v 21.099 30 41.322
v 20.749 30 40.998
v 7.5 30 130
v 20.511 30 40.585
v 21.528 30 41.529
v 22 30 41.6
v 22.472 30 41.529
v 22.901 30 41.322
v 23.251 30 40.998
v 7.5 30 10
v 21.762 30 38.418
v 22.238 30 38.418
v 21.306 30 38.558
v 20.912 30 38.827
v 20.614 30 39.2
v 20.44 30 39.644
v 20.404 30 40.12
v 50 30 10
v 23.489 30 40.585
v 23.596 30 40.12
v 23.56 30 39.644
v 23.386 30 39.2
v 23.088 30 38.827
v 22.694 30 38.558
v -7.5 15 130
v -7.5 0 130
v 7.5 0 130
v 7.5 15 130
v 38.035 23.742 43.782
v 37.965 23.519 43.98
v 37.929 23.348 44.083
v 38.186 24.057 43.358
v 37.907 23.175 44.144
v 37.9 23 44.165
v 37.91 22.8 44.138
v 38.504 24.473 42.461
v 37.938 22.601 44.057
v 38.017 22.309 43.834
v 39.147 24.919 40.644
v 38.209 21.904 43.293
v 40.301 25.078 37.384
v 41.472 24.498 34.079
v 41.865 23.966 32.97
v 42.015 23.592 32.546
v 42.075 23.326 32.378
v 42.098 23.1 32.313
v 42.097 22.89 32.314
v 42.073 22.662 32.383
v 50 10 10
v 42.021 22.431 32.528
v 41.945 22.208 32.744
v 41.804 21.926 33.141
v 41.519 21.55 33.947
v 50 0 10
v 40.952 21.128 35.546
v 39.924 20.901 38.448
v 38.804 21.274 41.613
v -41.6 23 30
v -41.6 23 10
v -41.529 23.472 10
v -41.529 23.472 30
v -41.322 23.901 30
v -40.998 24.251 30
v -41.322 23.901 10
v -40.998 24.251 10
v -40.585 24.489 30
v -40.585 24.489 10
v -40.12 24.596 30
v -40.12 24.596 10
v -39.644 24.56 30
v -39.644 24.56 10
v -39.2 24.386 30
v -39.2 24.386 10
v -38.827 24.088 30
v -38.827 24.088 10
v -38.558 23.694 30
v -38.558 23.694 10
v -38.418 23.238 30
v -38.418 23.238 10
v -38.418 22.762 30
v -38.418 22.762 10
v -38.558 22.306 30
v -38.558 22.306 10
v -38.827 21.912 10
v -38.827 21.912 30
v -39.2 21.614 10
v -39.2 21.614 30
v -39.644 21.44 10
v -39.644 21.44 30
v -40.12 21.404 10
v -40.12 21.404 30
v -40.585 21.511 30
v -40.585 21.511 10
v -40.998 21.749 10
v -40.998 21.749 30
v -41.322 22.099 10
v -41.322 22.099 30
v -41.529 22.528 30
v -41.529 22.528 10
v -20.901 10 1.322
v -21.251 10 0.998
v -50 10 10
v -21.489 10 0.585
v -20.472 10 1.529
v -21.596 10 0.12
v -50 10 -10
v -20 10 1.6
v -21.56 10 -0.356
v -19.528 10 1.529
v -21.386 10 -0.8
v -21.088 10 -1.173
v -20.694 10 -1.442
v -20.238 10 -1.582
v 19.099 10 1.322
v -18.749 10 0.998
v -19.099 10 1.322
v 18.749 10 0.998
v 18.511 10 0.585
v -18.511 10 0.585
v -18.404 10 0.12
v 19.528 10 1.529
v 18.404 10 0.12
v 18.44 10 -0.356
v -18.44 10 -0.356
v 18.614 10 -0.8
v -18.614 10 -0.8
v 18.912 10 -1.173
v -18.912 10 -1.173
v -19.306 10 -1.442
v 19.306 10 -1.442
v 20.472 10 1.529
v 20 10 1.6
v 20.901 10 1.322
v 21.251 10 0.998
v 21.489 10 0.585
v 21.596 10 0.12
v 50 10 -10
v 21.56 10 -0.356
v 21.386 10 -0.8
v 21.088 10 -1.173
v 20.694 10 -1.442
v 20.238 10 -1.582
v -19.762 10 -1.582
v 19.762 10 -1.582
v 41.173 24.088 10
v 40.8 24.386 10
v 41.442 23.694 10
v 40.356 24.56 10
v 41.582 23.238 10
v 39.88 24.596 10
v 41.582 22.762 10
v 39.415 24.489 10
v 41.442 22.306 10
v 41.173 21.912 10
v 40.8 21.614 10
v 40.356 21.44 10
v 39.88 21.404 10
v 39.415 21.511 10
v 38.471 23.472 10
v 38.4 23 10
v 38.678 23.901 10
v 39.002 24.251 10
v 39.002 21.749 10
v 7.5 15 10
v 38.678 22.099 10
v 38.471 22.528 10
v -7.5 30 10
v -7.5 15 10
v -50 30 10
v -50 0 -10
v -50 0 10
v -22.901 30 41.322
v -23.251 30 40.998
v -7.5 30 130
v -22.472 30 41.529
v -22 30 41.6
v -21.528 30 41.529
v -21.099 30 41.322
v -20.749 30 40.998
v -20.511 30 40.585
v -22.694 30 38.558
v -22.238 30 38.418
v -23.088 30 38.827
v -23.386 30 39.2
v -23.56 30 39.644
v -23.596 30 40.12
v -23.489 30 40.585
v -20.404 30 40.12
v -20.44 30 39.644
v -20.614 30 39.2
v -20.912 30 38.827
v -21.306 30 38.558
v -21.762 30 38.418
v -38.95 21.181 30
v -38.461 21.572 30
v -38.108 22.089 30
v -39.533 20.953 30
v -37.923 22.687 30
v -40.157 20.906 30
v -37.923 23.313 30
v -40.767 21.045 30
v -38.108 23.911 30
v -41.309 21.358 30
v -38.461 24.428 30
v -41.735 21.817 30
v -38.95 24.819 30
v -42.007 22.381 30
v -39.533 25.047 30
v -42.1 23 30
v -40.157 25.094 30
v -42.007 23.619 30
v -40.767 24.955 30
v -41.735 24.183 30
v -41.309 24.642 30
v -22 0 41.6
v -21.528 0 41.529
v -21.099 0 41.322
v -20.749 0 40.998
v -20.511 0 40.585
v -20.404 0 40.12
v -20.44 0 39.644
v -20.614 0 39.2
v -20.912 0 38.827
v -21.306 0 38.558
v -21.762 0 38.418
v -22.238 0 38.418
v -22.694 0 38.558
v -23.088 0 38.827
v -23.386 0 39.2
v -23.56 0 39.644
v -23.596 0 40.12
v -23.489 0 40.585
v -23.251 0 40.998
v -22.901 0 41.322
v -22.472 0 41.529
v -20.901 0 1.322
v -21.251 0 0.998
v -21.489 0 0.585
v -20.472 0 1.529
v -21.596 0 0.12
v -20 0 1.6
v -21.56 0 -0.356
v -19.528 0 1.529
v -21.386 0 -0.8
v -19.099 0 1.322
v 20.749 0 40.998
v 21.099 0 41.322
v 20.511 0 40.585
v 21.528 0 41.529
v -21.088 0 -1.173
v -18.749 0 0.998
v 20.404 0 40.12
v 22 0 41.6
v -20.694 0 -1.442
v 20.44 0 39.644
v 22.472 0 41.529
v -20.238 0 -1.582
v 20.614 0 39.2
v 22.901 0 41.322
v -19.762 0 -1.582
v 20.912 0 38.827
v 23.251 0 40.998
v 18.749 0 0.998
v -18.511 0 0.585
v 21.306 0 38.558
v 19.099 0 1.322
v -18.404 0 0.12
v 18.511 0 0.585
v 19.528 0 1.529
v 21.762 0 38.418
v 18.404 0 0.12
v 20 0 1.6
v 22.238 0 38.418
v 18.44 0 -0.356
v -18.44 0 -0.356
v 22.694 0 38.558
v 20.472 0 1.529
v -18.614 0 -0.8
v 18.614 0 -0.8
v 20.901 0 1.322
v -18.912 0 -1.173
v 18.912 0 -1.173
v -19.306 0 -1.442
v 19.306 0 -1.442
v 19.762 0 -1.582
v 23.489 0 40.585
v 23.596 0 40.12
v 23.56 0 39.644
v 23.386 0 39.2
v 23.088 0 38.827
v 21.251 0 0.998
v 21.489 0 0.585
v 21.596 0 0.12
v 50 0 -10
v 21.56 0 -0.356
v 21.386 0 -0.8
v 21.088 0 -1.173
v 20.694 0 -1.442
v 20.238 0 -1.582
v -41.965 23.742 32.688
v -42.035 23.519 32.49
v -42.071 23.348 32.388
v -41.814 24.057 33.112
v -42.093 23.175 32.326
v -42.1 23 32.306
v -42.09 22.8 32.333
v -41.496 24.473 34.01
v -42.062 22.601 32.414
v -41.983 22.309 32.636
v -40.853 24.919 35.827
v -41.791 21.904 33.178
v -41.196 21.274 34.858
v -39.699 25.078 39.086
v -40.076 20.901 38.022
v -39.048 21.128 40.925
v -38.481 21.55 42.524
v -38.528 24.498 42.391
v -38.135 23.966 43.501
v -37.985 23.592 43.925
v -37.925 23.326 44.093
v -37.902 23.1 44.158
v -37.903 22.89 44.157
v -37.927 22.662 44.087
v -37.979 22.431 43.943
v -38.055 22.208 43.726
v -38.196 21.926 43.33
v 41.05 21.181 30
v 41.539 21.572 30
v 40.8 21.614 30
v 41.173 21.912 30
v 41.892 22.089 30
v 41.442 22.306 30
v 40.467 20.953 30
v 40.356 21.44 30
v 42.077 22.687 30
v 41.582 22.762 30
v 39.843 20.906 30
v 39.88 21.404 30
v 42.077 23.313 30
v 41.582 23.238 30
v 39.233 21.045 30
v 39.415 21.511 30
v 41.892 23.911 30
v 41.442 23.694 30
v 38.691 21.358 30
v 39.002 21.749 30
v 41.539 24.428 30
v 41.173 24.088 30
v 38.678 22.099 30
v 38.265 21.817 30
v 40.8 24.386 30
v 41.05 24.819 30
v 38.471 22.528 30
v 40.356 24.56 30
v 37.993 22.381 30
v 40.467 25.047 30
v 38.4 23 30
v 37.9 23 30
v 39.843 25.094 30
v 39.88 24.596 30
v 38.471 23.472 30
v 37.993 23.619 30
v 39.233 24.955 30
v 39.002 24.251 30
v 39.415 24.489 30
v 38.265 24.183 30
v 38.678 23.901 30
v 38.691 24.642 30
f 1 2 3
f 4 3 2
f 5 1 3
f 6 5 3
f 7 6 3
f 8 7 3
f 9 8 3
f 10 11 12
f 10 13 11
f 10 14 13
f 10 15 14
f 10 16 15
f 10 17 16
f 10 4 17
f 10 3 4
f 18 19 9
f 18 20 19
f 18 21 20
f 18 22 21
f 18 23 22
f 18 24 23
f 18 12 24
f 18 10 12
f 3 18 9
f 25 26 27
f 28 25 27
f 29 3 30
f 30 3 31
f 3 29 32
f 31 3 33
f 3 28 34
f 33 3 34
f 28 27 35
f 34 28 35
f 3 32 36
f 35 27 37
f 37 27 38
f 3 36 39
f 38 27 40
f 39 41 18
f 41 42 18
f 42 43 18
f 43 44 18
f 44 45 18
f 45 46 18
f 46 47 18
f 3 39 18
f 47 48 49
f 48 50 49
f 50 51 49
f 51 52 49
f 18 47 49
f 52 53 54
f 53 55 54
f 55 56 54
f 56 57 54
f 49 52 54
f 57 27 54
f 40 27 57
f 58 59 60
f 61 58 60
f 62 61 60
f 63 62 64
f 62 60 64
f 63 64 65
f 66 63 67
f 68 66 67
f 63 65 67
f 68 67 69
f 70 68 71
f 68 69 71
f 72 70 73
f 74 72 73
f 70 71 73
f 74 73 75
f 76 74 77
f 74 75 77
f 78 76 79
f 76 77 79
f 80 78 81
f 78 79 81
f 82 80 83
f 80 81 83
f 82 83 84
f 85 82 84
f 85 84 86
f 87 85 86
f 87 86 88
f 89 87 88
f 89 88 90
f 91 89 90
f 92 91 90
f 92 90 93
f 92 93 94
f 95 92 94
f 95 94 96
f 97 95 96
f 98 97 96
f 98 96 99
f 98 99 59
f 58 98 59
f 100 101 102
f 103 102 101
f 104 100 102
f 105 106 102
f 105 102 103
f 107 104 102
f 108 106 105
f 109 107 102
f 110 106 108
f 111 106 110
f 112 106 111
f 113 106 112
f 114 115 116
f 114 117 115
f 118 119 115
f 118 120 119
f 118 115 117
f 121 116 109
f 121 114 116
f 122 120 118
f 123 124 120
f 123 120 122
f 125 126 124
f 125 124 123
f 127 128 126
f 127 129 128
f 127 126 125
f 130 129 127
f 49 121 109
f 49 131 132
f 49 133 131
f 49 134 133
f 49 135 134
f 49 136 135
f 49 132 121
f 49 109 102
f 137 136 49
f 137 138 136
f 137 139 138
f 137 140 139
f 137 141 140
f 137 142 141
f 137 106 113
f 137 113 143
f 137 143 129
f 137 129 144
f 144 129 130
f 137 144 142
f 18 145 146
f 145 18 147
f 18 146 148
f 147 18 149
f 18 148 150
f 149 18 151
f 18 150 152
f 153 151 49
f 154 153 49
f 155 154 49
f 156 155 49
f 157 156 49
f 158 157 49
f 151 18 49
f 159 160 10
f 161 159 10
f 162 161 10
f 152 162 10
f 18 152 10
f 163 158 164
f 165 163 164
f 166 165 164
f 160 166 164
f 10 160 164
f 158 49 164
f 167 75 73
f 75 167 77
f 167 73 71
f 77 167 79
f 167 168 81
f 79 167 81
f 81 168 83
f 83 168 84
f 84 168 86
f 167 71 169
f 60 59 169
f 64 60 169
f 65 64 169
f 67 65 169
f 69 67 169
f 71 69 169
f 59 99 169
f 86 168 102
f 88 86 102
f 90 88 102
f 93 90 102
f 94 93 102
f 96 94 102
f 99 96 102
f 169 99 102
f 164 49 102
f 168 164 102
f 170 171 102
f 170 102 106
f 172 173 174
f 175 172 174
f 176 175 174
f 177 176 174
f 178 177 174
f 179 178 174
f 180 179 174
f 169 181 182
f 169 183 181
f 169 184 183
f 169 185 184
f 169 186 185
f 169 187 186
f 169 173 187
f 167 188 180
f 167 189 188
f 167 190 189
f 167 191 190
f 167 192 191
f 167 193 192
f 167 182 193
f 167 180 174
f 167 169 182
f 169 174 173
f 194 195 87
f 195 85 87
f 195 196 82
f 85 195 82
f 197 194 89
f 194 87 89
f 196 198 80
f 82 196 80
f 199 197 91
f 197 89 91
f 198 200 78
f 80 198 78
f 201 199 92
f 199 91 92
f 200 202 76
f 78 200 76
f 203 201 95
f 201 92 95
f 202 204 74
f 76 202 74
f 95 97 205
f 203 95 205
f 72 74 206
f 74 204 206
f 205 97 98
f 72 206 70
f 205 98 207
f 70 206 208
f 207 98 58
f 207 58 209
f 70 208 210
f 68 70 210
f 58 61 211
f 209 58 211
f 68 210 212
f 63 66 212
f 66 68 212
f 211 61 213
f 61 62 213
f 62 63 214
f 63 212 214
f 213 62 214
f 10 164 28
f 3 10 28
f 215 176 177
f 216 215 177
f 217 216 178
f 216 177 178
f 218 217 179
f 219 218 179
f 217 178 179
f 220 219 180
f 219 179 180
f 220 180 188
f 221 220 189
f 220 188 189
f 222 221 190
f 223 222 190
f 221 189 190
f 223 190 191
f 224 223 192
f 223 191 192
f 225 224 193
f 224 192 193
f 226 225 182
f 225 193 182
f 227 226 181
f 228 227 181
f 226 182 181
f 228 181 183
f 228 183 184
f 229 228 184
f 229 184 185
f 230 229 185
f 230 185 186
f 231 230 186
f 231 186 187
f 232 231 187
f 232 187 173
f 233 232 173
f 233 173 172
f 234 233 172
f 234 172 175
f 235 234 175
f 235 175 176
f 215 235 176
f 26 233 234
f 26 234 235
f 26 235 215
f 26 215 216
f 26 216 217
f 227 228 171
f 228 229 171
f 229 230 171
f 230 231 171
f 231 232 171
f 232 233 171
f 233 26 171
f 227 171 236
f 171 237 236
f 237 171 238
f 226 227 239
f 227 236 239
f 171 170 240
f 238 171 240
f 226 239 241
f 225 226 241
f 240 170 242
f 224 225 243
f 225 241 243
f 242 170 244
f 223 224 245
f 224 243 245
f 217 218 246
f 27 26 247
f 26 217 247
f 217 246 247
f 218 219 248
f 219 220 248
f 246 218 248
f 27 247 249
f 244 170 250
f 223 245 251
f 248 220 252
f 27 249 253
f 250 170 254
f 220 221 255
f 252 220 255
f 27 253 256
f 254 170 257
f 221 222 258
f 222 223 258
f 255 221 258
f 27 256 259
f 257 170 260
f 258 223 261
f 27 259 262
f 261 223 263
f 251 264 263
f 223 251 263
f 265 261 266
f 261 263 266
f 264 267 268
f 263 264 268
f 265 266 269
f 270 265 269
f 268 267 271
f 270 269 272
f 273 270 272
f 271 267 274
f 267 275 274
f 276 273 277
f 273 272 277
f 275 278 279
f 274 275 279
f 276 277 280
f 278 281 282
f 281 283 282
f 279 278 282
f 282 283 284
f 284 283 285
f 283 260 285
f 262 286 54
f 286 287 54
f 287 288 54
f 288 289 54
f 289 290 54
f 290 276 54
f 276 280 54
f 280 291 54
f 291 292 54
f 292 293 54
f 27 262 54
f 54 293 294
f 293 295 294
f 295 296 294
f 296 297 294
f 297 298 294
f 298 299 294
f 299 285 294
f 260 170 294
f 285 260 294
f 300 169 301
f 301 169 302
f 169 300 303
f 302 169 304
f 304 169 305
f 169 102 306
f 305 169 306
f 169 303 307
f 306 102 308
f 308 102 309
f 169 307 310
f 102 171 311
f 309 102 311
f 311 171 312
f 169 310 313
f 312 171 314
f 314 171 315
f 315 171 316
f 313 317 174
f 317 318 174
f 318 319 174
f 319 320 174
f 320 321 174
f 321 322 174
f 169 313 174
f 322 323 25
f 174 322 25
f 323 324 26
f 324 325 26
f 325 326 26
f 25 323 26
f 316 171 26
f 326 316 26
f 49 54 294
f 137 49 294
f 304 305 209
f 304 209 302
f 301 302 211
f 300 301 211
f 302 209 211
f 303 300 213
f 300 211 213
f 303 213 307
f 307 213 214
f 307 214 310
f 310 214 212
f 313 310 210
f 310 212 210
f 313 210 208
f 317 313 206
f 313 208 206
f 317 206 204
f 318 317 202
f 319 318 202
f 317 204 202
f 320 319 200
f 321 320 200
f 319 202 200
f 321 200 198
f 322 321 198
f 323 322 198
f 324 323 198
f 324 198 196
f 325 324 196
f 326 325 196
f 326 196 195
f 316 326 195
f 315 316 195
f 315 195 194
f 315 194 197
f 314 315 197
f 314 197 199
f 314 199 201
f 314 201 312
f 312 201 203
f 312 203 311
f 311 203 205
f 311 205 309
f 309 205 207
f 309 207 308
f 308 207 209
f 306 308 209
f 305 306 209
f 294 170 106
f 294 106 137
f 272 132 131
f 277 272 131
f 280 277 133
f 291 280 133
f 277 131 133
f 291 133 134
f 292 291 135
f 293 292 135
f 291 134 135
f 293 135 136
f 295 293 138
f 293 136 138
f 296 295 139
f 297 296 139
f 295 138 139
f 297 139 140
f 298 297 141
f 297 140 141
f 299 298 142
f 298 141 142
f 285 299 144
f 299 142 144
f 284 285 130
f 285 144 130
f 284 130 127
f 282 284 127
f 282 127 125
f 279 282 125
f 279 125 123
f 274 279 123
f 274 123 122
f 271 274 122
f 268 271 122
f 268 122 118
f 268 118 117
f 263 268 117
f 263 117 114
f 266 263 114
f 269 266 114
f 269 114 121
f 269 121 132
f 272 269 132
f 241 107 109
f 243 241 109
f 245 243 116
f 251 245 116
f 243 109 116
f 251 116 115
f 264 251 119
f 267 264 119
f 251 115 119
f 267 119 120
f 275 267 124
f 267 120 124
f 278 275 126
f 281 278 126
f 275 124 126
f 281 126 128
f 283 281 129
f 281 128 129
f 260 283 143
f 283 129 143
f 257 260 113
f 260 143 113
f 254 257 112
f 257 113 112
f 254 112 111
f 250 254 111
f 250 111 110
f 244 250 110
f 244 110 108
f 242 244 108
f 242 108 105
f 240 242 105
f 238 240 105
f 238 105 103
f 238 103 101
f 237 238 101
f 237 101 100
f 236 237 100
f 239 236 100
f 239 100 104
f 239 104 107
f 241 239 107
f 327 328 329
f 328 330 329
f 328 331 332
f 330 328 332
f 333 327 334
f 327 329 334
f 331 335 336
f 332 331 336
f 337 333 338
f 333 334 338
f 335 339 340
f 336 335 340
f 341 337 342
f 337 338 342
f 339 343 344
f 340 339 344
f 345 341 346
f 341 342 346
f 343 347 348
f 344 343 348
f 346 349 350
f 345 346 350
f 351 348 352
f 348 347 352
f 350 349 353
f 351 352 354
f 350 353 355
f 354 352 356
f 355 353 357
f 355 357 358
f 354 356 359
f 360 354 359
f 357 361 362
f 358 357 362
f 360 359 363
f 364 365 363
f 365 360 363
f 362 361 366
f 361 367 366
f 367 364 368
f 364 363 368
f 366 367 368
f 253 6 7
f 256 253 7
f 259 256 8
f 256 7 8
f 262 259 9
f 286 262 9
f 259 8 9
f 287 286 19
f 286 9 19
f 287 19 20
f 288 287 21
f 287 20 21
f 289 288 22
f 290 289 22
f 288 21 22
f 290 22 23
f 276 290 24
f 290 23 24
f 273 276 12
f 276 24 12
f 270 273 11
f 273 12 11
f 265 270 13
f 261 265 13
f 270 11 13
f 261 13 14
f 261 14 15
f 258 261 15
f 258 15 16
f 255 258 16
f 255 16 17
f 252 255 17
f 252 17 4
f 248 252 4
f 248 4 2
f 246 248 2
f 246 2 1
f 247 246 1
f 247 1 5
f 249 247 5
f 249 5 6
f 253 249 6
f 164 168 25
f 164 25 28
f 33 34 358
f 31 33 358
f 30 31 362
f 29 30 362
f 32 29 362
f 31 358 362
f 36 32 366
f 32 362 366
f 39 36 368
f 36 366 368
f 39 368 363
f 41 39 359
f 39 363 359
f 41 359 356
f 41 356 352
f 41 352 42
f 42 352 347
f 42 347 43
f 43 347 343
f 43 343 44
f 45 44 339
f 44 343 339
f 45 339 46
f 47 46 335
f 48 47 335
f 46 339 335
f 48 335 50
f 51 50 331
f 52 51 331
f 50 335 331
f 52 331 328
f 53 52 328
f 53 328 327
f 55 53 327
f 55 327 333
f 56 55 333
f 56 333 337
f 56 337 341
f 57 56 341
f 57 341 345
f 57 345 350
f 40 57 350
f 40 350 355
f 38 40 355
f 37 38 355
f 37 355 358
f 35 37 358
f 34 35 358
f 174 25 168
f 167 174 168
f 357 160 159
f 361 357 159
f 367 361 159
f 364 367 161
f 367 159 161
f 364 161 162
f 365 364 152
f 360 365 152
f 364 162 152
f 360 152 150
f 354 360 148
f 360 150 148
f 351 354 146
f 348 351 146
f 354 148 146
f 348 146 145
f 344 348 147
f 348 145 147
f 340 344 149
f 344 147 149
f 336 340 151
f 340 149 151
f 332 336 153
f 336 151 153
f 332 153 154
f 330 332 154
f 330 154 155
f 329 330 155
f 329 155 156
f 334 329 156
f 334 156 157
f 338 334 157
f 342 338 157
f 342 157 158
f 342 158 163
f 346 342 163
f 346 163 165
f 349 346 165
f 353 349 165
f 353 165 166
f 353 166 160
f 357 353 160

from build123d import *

# Parameters (mm, degrees)
EXTRUDE_1_DEPTH     = 10
EXTRUDE_2_DEPTH     = 15
SKETCH_2_R          = 1.6
CUT_EXTRUDE_1_DEPTH = 15
EXTRUDE_START       = 10
EXTRUDE_3_DEPTH     = 20
SKETCH_5_R          = 1.6
CUT_EXTRUDE_4_DEPTH = 100
SKETCH_6_R          = 1.6
CUT_EXTRUDE_5_DEPTH = 100
CUT_EXTRUDE_START   = -20
SKETCH_7_R          = 2.1
CUT_EXTRUDE_6_DEPTH = 100


with BuildPart() as part:
    # 草图1 → 凸台-拉伸1 (new body)
    with BuildSketch(Plane(origin=(0, 0, 0), x_dir=(1, 0, 0), z_dir=(0, 1, 0))):
        Polygon((-50, 10), (-50, -10), (-7.5, -130), (7.5, -130), (50, -10), (50, 10), align=None)
    extrude(amount=EXTRUDE_1_DEPTH)

    # 草图1<3> → 凸台-拉伸2 (add)
    with BuildSketch(Plane(origin=(0, 0, 0), x_dir=(1, 0, 0), z_dir=(0, 1, 0))):
        Polygon((-50, -10), (-7.5, -130), (7.5, -130), (50, -10), align=None)
    extrude(amount=EXTRUDE_2_DEPTH)

    # 草图2 → 切除-拉伸1 (cut)
    with BuildSketch(Plane(origin=(0, 10, 0), x_dir=(1, 0, 0), z_dir=(0, 1, 0))):
        with Locations((20, 0)):
            Circle(SKETCH_2_R)
        with Locations((-20, 0)):
            Circle(SKETCH_2_R)
    extrude(amount=-CUT_EXTRUDE_1_DEPTH, mode=Mode.SUBTRACT)

    # 草图1<4> → 凸台-拉伸3 (add)
    with BuildSketch(Plane(origin=(0, 0, 0), x_dir=(1, 0, 0), z_dir=(0, 1, 0)).offset(EXTRUDE_START)):
        Polygon((-7.5, -10), (-50, -10), (-7.5, -130), align=None)
        Polygon((50, -10), (7.5, -10), (7.5, -130), align=None)
    extrude(amount=EXTRUDE_3_DEPTH)

    # 草图5 → 切除-拉伸4 (cut)
    with BuildSketch(Plane(origin=(0, 30, 0), x_dir=(1, 0, 0), z_dir=(0, 1, 0))):
        with Locations((22, -40)):
            Circle(SKETCH_5_R)
        with Locations((-22, -40)):
            Circle(SKETCH_5_R)
    extrude(amount=-CUT_EXTRUDE_4_DEPTH, mode=Mode.SUBTRACT)

    # 草图6 → 切除-拉伸5 (cut)
    with BuildSketch(Plane(origin=(0, 0, 10), x_dir=(-1, 0, 0), z_dir=(0, 0, -1))):
        with Locations((40, 23)):
            Circle(SKETCH_6_R)
        with Locations((-40, 23)):
            Circle(SKETCH_6_R)
    extrude(amount=-CUT_EXTRUDE_5_DEPTH, mode=Mode.SUBTRACT)

    # 草图7 → 切除-拉伸6 (cut)
    with BuildSketch(Plane(origin=(0, 0, 10), x_dir=(-1, 0, 0), z_dir=(0, 0, -1)).offset(CUT_EXTRUDE_START)):
        with Locations((-40, 23)):
            Circle(SKETCH_7_R)
        with Locations((40, 23)):
            Circle(SKETCH_7_R)
    extrude(amount=-CUT_EXTRUDE_6_DEPTH, mode=Mode.SUBTRACT)


solid = part.part
